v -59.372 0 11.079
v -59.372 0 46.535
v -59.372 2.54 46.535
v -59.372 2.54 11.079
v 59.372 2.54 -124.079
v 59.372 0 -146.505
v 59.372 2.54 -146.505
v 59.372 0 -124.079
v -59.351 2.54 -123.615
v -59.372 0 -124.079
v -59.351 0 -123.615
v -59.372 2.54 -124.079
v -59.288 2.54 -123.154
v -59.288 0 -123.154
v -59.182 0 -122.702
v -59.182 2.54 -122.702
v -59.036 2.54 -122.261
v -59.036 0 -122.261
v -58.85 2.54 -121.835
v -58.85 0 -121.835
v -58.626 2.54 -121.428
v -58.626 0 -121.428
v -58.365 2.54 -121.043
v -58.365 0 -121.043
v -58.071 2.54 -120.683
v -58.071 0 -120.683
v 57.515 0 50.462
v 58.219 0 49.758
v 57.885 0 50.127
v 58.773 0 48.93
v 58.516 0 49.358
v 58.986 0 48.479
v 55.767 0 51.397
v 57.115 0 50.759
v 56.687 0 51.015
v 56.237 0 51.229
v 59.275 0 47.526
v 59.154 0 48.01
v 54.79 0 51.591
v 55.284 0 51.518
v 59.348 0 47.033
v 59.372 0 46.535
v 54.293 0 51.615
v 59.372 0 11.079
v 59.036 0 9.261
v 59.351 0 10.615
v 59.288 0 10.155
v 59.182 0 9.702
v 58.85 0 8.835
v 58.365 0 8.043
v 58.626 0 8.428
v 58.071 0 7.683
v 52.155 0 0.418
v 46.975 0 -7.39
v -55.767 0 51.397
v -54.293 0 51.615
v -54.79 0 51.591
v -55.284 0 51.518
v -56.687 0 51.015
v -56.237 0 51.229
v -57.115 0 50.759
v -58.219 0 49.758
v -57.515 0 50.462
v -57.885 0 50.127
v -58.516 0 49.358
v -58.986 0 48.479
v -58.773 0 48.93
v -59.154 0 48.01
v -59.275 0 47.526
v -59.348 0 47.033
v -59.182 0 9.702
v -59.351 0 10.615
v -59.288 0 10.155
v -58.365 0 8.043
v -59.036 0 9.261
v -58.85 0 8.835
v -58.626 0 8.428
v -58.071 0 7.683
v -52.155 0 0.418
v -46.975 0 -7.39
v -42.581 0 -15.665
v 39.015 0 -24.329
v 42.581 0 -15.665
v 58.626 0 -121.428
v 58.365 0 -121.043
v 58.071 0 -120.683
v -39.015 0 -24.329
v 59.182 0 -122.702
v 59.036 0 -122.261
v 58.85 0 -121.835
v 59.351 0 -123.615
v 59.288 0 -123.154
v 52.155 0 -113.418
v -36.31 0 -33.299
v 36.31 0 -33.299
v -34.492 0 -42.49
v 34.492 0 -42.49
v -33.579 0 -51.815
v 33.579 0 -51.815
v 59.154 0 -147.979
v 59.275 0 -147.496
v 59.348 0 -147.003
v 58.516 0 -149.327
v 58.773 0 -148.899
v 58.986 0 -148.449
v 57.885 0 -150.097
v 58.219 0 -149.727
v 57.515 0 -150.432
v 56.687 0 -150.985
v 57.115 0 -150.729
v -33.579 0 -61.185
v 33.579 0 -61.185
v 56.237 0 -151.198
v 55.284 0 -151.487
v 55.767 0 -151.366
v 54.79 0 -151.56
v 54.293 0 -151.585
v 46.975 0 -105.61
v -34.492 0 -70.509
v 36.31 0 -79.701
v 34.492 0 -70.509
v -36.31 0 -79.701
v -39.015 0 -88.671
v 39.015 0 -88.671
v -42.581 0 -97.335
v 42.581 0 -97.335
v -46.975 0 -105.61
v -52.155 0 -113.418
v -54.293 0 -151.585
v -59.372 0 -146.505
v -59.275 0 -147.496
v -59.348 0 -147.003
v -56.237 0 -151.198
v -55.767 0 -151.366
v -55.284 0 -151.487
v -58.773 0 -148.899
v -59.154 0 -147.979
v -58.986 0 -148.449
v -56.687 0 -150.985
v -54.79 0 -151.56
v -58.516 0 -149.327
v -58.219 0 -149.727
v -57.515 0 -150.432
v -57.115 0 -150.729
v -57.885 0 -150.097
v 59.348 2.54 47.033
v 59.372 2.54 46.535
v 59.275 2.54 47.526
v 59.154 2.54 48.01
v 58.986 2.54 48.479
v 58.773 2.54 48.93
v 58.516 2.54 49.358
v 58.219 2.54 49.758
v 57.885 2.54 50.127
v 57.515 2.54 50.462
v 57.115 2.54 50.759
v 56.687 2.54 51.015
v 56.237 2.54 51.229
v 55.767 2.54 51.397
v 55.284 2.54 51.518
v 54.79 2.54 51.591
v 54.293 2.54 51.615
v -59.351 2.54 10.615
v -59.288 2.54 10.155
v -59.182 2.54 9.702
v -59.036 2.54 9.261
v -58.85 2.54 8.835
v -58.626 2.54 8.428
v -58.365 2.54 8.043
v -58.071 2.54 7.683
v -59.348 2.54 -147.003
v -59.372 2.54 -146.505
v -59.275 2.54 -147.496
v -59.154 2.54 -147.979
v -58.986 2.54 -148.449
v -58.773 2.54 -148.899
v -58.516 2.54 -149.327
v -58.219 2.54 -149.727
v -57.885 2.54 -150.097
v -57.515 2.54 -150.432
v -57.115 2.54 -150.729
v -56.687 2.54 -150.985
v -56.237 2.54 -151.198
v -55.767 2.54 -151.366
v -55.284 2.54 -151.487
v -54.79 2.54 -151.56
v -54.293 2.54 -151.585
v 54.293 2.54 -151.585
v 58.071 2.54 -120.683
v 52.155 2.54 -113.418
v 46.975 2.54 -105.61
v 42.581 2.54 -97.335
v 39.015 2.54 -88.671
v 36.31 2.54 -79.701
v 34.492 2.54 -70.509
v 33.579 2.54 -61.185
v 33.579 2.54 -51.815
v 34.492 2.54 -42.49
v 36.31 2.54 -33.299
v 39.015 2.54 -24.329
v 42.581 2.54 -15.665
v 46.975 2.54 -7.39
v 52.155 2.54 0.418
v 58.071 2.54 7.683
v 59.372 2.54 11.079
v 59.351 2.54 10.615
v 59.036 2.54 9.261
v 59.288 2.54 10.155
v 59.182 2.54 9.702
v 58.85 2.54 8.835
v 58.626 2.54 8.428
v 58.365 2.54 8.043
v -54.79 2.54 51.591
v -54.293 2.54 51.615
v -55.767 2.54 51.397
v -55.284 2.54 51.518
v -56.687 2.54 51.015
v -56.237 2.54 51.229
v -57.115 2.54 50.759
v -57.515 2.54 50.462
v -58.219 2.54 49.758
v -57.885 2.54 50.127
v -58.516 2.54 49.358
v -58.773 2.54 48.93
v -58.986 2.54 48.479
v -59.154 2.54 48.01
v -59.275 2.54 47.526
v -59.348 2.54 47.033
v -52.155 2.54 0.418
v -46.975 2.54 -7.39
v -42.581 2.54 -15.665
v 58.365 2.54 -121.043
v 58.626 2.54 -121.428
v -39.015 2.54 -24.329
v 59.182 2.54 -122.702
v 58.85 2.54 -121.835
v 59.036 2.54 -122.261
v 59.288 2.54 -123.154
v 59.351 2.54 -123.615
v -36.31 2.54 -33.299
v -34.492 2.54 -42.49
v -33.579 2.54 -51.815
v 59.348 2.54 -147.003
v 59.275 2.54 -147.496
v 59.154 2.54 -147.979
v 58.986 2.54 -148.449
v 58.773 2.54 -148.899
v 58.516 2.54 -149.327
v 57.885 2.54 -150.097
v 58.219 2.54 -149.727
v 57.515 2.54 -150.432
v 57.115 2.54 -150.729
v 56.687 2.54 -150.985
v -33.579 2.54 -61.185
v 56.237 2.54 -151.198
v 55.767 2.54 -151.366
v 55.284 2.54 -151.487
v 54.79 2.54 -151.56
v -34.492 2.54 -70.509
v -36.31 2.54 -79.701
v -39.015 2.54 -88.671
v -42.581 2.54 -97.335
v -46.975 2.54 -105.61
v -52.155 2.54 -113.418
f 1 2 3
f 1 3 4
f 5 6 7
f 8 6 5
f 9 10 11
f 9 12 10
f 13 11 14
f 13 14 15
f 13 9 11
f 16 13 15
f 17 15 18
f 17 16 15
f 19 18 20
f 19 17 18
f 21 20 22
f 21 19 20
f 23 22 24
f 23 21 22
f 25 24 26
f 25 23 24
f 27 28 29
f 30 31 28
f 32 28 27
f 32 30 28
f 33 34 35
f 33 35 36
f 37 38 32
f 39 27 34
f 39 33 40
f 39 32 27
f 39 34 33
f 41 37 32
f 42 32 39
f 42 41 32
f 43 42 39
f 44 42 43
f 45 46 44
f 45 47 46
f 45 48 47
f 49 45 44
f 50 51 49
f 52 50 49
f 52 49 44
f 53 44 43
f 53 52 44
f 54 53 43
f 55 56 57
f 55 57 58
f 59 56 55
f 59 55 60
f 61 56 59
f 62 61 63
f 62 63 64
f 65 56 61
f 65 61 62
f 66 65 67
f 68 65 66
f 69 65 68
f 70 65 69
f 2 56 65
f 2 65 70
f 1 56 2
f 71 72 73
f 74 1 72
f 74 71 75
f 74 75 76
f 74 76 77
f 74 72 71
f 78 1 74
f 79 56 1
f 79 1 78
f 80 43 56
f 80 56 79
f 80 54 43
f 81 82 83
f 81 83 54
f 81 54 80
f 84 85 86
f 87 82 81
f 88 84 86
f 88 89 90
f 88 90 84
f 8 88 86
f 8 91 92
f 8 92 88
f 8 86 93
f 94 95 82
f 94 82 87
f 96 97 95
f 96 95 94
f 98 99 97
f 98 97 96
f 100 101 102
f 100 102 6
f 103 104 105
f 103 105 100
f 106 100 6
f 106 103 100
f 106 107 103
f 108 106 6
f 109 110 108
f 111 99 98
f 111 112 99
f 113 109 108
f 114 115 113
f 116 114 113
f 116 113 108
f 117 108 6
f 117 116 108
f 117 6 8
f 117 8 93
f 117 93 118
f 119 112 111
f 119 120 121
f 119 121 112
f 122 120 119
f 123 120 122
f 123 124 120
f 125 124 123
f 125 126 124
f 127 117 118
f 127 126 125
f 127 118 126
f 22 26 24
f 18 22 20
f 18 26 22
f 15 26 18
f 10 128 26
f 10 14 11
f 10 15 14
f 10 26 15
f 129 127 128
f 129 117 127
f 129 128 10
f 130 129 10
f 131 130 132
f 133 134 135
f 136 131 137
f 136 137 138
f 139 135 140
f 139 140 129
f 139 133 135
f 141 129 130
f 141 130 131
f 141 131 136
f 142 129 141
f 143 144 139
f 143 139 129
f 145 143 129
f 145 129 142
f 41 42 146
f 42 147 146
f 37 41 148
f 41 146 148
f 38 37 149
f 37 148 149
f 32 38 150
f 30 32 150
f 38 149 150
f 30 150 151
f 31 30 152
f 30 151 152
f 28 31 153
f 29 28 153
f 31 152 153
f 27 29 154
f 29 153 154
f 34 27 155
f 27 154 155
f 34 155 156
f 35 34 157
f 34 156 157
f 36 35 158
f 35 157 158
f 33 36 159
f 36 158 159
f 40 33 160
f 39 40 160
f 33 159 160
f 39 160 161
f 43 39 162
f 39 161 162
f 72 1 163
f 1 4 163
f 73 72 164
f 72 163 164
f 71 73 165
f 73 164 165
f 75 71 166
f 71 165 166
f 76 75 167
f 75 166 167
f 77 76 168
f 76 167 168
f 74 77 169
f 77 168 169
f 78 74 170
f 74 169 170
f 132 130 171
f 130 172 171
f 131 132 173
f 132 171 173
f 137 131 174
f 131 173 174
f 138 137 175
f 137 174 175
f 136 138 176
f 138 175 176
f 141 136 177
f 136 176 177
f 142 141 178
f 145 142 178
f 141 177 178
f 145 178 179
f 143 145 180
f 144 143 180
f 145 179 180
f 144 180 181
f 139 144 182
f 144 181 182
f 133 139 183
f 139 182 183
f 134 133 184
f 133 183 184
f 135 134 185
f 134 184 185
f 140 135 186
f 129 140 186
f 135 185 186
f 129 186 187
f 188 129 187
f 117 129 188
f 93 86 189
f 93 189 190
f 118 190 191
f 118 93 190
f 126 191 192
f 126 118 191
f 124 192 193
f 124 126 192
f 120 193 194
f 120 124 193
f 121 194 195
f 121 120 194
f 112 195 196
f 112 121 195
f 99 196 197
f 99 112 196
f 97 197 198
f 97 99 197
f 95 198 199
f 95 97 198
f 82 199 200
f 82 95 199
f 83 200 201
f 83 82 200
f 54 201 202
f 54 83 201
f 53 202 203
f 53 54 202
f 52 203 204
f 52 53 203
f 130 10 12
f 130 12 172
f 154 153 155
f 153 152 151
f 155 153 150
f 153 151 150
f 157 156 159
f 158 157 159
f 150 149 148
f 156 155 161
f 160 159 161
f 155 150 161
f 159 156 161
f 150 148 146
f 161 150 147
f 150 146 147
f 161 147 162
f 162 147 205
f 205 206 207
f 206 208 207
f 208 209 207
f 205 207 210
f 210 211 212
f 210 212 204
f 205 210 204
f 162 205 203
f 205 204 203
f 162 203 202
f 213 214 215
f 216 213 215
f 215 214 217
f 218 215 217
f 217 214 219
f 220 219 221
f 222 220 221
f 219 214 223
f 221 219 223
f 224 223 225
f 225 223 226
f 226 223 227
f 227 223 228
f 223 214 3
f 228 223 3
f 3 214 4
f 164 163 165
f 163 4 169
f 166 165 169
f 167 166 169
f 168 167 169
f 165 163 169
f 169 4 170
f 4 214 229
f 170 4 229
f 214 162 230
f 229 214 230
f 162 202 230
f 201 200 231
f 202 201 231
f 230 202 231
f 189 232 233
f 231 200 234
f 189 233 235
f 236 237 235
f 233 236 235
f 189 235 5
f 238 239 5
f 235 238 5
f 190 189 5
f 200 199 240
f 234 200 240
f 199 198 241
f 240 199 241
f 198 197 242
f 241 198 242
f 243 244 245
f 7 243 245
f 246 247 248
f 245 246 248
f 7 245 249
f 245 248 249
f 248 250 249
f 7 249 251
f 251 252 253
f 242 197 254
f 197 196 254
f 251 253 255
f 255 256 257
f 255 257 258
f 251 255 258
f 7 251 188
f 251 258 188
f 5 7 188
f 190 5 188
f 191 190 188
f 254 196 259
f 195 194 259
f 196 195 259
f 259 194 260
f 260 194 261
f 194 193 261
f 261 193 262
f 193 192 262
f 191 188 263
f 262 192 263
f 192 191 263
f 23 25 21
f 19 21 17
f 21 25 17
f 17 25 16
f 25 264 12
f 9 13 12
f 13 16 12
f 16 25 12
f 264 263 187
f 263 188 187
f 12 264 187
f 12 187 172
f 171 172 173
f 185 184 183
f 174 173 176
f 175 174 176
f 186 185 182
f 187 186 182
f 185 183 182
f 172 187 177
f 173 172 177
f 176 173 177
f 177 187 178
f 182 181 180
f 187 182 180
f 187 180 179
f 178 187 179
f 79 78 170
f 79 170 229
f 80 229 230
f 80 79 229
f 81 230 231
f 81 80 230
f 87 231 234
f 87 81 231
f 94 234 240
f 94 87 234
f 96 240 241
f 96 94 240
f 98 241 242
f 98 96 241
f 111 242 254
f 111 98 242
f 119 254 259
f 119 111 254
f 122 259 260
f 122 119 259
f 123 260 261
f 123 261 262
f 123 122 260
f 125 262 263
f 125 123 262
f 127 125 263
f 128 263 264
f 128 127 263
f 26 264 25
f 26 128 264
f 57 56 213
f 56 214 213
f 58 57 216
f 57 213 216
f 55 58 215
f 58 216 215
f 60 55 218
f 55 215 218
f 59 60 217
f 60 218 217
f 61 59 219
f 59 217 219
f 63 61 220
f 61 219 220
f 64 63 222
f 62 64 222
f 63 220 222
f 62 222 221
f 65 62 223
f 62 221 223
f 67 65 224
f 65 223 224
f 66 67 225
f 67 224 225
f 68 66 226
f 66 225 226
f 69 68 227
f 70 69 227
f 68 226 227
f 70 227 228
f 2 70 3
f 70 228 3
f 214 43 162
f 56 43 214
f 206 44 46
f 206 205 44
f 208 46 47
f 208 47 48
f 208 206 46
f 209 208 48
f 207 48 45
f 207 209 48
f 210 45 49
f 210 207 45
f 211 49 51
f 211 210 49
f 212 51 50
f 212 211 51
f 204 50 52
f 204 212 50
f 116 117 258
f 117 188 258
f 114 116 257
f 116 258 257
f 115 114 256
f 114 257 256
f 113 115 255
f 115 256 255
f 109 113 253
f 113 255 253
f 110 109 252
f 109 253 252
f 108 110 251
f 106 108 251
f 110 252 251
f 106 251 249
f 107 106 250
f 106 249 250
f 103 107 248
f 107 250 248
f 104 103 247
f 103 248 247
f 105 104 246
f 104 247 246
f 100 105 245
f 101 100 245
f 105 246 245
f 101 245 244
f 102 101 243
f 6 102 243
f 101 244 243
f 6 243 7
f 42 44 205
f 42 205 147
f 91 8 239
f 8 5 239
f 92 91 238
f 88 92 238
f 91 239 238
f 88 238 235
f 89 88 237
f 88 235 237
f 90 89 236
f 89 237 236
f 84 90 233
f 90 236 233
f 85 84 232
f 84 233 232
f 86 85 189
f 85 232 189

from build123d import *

# Parameters (mm, degrees)
BOSS_EXTRUDE1_DEPTH = 2.54
FILLET3_R           = 5.08
FILLET4_R           = 5.08
FILLET5_R           = 5.08
FILLET6_R           = 5.08
FILLET7_R           = 5.08
FILLET8_R           = 5.08
FILLET9_R           = 5.08
FILLET10_R          = 5.08


with BuildPart() as part:
    # Sketch2 → Boss-Extrude1 (new body)
    with BuildSketch(Plane(origin=(0, 0, 0), x_dir=(1, 0, 0), z_dir=(0, 1, 0))):
        with BuildLine():
            Line((-59.3725, 122.102714319), (-59.3725, 151.584711055))
            Line((-59.3725, 151.584711055), (59.3725, 151.584711055))
            Line((59.3725, 151.584711055), (59.3725, 122.102714319))
            ThreePointArc((59.3725, 122.102714319), (33.4645, 56.499868893), (59.3725, -9.102976533))
            Line((59.3725, -9.102976533), (59.3725, -51.615288945))
            Line((59.3725, -51.615288945), (-59.3725, -51.615288945))
            Line((-59.3725, -51.615288945), (-59.3725, -9.102976533))
            ThreePointArc((-59.3725, -9.102976533), (-33.4645, 56.499868893), (-59.3725, 122.102714319))
        make_face()
    extrude(amount=BOSS_EXTRUDE1_DEPTH)

    # Fillet3
    fillet3_edges = [part.edges().sort_by_distance(p)[0] for p in [
        (-59.3725, 1.27, -151.584711055),
    ]]
    fillet(fillet3_edges, radius=FILLET3_R)

    # Fillet4
    fillet4_edges = [part.edges().sort_by_distance(p)[0] for p in [
        (59.3725, 1.27, -151.584711055),
    ]]
    fillet(fillet4_edges, radius=FILLET4_R)

    # Fillet5
    fillet5_edges = [part.edges().sort_by_distance(p)[0] for p in [
        (-59.3725, 1.27, -122.102714319),
    ]]
    fillet(fillet5_edges, radius=FILLET5_R)

    # Fillet6
    fillet6_edges = [part.edges().sort_by_distance(p)[0] for p in [
        (59.3725, 1.27, -122.102714319),
    ]]
    fillet(fillet6_edges, radius=FILLET6_R)

    # Fillet7
    fillet7_edges = [part.edges().sort_by_distance(p)[0] for p in [
        (-59.3725, 1.27, 9.102976533),
    ]]
    fillet(fillet7_edges, radius=FILLET7_R)

    # Fillet8
    fillet8_edges = [part.edges().sort_by_distance(p)[0] for p in [
        (59.3725, 1.27, 9.102976533),
    ]]
    fillet(fillet8_edges, radius=FILLET8_R)

    # Fillet9
    fillet9_edges = [part.edges().sort_by_distance(p)[0] for p in [
        (59.3725, 1.27, 51.615288945),
    ]]
    fillet(fillet9_edges, radius=FILLET9_R)

    # Fillet10
    fillet10_edges = [part.edges().sort_by_distance(p)[0] for p in [
        (-59.3725, 1.27, 51.615288945),
    ]]
    fillet(fillet10_edges, radius=FILLET10_R)


solid = part.part
